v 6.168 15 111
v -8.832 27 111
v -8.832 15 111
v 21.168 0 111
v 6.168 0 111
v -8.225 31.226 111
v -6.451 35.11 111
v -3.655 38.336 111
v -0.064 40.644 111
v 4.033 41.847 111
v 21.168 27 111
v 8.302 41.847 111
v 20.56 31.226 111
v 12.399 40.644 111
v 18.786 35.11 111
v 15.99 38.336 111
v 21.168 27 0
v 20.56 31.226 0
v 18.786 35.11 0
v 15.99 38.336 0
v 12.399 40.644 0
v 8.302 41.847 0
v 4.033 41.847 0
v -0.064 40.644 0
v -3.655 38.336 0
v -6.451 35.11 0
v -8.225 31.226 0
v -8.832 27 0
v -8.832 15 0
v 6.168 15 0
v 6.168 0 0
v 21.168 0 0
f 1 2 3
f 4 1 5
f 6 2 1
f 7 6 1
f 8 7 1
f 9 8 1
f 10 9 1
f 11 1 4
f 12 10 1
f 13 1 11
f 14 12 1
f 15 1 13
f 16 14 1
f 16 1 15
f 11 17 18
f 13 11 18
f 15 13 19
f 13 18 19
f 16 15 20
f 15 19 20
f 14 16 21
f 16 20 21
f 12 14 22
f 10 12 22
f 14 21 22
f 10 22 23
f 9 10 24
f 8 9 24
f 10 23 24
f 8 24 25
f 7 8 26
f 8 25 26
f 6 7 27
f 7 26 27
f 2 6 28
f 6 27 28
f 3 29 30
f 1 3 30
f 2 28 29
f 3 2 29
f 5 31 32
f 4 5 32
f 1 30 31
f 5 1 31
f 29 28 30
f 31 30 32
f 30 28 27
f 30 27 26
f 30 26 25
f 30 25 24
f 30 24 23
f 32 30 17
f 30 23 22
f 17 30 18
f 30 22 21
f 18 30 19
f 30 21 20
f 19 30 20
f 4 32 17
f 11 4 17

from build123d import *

# Parameters (mm, degrees)
F1_DEPTH = 111


with BuildPart() as f1:
    # F0 (on Top) → F1 (new body)
    with BuildSketch(Plane.XY):
        Polygon((6.167513, 15), (6.167513, 0), (21.167513, 0), (21.167513, 27), (-8.832487, 27), (-8.832487, 15), align=None)
        with BuildLine():
            Line((-8.832487, 27), (21.167513, 27))
            ThreePointArc((21.167513, 27), (6.167513, 42), (-8.832487, 27))
        make_face()
    extrude(amount=F1_DEPTH)


solid = f1.part
